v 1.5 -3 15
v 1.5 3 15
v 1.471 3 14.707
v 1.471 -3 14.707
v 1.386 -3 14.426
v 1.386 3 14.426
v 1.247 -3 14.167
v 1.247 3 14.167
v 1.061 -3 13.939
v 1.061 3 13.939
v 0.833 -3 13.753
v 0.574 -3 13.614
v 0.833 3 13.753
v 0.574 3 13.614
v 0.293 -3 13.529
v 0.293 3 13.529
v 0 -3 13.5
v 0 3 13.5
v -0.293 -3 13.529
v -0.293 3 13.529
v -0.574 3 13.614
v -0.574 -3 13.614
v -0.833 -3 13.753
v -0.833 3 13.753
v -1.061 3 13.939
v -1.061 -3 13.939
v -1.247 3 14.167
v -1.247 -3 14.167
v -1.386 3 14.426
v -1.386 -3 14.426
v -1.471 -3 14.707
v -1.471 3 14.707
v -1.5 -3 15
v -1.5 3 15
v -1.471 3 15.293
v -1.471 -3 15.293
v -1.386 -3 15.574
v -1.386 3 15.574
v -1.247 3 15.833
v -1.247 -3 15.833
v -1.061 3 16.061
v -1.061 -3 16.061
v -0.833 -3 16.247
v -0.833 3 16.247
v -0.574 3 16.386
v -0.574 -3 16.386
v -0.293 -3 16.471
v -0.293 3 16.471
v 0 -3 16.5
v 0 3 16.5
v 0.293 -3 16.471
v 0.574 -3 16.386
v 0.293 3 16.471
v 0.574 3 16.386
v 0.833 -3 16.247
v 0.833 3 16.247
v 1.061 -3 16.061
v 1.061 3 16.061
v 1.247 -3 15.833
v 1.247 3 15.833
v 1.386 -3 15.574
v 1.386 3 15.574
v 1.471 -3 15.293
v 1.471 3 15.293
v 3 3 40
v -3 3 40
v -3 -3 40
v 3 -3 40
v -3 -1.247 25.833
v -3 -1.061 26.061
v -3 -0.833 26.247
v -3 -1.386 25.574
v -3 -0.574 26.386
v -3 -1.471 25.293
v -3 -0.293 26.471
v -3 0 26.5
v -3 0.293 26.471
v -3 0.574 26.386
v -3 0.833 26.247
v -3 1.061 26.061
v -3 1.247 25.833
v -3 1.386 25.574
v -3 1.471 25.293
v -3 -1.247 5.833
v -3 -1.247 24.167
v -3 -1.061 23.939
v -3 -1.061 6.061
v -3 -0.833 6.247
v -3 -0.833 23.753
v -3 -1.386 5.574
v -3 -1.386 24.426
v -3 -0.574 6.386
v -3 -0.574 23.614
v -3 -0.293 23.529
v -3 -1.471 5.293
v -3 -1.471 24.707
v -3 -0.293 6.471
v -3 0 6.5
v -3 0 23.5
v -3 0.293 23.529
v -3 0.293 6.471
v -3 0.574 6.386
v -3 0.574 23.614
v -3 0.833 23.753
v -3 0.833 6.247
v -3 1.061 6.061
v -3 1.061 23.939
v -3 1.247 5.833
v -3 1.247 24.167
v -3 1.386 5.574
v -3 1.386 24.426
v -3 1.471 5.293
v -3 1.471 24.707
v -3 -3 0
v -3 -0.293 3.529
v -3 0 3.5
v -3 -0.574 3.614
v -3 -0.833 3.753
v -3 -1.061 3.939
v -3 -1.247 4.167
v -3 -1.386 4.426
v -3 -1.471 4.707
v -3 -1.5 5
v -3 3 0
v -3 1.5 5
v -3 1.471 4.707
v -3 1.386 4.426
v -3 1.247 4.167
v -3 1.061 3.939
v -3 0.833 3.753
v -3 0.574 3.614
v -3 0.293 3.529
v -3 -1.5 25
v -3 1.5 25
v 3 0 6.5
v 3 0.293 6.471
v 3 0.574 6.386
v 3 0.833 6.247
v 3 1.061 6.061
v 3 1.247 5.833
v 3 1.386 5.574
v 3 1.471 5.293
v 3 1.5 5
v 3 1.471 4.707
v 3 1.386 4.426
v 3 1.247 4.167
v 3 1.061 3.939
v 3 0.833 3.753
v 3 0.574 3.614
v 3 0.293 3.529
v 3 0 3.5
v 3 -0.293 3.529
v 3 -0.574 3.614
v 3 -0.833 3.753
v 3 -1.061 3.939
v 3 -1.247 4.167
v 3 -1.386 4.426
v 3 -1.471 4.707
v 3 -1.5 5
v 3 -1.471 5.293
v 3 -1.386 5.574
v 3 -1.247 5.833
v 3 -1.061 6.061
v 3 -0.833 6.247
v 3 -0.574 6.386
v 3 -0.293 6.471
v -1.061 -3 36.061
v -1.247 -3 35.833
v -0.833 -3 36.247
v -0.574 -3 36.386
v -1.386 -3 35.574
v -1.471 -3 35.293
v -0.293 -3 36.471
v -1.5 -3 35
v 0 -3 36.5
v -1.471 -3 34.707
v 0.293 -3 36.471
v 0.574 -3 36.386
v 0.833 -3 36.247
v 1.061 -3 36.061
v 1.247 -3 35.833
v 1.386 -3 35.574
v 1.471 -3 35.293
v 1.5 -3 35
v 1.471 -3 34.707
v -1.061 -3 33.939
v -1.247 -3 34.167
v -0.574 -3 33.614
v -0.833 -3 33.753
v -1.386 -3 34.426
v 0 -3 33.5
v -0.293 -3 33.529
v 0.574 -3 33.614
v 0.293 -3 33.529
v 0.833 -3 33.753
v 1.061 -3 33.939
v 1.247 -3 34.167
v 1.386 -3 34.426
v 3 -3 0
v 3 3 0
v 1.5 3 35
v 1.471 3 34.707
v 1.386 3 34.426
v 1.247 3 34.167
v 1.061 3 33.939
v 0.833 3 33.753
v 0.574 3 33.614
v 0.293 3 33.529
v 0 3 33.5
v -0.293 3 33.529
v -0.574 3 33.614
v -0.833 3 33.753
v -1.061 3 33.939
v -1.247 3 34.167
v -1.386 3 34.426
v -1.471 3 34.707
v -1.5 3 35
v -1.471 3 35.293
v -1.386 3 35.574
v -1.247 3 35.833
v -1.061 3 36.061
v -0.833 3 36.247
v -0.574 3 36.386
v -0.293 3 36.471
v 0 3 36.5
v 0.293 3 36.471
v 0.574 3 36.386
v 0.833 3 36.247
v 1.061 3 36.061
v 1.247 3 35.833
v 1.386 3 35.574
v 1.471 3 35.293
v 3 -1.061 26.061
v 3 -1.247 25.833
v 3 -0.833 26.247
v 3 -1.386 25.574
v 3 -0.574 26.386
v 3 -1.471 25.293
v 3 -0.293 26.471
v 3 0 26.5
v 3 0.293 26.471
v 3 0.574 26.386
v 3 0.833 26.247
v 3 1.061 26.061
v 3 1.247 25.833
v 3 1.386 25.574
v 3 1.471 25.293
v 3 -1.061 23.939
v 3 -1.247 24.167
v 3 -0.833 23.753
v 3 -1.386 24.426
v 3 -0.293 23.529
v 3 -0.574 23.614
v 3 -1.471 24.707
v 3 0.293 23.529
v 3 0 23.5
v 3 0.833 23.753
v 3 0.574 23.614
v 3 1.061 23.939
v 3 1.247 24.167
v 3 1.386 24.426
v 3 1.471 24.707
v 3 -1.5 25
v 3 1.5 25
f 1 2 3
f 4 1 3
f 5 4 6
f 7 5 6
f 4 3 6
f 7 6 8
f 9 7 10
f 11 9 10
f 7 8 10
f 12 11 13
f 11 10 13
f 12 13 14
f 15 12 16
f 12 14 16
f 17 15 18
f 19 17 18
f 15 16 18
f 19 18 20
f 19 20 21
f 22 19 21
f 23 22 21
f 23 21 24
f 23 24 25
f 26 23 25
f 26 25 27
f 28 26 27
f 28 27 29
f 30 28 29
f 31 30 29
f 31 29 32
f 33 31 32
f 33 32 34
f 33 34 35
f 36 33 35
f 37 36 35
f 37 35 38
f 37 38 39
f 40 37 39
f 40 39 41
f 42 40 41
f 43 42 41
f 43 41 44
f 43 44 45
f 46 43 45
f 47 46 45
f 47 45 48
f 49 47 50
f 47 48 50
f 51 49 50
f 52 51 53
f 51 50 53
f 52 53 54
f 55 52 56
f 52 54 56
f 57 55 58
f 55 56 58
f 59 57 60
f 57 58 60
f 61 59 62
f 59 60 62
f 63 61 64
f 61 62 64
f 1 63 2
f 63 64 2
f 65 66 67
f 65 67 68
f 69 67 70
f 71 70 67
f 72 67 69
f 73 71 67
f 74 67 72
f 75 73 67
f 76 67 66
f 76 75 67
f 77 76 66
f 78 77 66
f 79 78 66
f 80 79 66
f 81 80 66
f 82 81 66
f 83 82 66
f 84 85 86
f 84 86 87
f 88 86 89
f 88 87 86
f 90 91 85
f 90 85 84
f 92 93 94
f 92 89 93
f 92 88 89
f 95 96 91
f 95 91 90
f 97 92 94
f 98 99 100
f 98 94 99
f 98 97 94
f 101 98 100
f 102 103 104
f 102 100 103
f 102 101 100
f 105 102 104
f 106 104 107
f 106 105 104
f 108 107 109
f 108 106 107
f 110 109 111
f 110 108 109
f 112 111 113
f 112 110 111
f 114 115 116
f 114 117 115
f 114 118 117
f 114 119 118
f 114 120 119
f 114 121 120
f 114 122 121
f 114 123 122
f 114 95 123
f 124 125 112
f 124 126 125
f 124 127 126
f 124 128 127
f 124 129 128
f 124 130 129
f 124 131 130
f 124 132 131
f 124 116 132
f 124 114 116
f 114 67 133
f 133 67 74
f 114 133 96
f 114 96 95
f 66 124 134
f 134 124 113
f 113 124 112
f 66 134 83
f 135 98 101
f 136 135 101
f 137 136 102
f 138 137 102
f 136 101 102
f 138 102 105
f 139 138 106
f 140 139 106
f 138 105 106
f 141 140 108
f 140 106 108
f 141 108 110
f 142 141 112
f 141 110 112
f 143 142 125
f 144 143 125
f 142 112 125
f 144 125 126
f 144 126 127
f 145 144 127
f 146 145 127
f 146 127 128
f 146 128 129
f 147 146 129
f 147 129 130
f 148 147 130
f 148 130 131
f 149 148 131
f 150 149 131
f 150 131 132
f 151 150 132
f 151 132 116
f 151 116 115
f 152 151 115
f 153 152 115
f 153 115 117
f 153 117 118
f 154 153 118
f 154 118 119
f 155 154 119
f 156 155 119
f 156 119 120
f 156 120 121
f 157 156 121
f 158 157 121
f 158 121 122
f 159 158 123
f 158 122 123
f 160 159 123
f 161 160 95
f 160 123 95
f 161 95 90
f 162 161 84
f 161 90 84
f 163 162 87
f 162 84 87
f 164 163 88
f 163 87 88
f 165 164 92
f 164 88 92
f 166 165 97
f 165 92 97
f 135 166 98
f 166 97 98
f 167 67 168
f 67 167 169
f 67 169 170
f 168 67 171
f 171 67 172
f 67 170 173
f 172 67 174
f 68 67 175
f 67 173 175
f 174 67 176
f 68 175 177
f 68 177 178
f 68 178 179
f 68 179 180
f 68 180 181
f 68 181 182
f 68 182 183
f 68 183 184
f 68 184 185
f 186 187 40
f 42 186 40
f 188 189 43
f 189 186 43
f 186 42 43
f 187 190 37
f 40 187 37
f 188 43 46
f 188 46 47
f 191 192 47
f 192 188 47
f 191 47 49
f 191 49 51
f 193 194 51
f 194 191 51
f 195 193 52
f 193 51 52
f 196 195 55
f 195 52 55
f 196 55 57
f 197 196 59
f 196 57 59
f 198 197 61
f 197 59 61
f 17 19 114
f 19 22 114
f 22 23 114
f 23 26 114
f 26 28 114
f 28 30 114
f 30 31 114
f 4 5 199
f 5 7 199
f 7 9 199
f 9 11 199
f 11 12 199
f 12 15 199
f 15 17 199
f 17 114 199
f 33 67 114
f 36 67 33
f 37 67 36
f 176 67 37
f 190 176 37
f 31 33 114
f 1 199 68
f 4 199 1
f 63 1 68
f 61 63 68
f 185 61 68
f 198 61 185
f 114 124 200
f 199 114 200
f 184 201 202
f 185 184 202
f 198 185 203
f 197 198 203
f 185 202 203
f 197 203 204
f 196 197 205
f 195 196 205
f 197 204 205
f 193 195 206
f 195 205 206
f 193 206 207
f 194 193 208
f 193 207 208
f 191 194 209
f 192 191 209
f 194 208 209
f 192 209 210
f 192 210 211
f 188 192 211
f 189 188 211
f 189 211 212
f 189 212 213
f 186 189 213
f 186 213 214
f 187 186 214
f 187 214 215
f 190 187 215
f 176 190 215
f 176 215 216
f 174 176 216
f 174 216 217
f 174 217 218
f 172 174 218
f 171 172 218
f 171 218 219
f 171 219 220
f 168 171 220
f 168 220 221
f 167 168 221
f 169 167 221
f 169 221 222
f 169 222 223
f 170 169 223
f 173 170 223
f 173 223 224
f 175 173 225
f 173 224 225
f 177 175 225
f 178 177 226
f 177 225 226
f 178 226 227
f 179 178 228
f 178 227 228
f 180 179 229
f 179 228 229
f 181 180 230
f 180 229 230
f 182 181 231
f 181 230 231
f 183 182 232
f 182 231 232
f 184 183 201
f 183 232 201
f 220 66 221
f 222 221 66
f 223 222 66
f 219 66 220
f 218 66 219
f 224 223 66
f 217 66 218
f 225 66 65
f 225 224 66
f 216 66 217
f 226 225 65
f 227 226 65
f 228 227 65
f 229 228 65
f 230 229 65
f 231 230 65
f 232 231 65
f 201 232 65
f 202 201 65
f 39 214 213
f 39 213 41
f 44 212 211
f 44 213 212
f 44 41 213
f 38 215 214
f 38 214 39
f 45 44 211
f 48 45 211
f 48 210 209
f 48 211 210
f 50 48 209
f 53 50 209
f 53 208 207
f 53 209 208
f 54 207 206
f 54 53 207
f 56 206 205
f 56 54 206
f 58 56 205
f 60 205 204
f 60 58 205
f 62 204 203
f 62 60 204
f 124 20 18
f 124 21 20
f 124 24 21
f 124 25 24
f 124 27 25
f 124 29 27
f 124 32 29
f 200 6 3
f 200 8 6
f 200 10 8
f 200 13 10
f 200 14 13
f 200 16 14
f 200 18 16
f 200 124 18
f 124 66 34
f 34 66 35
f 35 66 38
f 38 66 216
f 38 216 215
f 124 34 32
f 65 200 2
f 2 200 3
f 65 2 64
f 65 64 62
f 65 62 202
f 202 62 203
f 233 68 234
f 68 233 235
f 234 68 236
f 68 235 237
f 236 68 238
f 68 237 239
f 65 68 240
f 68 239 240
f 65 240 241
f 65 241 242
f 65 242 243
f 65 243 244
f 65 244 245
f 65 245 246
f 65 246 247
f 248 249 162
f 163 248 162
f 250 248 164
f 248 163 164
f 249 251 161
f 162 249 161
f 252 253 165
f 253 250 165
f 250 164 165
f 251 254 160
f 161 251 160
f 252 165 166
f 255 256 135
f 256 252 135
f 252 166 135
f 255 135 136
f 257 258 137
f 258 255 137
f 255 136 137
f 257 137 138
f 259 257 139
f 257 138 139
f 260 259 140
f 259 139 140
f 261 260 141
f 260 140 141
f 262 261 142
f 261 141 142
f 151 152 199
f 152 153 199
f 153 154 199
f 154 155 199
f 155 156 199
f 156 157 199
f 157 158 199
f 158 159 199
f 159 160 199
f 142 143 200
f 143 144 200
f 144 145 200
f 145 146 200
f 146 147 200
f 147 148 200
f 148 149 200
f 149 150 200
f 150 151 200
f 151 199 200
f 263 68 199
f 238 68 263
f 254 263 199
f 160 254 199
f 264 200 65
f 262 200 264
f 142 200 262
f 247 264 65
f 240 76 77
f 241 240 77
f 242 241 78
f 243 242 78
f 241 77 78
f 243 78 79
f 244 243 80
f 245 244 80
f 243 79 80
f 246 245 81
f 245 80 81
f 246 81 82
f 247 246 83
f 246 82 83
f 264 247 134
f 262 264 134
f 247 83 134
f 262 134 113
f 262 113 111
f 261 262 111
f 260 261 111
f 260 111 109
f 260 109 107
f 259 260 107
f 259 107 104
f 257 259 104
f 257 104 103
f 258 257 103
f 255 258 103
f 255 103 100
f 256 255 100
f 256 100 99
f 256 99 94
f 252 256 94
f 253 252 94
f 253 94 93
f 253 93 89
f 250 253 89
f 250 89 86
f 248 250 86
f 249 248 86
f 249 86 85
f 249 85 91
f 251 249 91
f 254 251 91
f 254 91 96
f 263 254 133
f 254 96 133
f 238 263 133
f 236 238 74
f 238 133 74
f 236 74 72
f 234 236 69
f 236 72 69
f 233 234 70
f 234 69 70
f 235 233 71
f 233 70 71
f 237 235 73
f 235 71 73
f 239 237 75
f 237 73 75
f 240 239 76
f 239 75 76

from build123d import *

# Parameters (mm, degrees)
SKETCH_1_W          = 6
SKETCH_1_H          = 6
EXTRUDE_1_DEPTH     = 40
SKETCH_2_R          = 1.5
CUT_EXTRUDE_1_DEPTH = 7
SKETCH_3_R          = 1.5
CUT_EXTRUDE_2_DEPTH = 7


with BuildPart() as part:
    # 草图1 → 凸台-拉伸1 (new body)
    with BuildSketch(Plane.XY):
        Rectangle(SKETCH_1_W, SKETCH_1_H)
    extrude(amount=EXTRUDE_1_DEPTH)

    # 草图2 → 切除-拉伸1 (cut, through all)
    with BuildSketch(Plane.ZY.offset(3)):
        with Locations((5, 0)):
            Circle(SKETCH_2_R)
        with Locations((25, 0)):
            Circle(SKETCH_2_R)
    extrude(amount=-CUT_EXTRUDE_1_DEPTH, mode=Mode.SUBTRACT)

    # 草图3 → 切除-拉伸2 (cut, through all)
    with BuildSketch(Plane(origin=(0, 3, 0), x_dir=(1, 0, 0), z_dir=(0, 1, 0))):
        with Locations((0, -15)):
            Circle(SKETCH_3_R)
        with Locations((0, -35)):
            Circle(SKETCH_3_R)
    extrude(amount=-CUT_EXTRUDE_2_DEPTH, mode=Mode.SUBTRACT)


solid = part.part
